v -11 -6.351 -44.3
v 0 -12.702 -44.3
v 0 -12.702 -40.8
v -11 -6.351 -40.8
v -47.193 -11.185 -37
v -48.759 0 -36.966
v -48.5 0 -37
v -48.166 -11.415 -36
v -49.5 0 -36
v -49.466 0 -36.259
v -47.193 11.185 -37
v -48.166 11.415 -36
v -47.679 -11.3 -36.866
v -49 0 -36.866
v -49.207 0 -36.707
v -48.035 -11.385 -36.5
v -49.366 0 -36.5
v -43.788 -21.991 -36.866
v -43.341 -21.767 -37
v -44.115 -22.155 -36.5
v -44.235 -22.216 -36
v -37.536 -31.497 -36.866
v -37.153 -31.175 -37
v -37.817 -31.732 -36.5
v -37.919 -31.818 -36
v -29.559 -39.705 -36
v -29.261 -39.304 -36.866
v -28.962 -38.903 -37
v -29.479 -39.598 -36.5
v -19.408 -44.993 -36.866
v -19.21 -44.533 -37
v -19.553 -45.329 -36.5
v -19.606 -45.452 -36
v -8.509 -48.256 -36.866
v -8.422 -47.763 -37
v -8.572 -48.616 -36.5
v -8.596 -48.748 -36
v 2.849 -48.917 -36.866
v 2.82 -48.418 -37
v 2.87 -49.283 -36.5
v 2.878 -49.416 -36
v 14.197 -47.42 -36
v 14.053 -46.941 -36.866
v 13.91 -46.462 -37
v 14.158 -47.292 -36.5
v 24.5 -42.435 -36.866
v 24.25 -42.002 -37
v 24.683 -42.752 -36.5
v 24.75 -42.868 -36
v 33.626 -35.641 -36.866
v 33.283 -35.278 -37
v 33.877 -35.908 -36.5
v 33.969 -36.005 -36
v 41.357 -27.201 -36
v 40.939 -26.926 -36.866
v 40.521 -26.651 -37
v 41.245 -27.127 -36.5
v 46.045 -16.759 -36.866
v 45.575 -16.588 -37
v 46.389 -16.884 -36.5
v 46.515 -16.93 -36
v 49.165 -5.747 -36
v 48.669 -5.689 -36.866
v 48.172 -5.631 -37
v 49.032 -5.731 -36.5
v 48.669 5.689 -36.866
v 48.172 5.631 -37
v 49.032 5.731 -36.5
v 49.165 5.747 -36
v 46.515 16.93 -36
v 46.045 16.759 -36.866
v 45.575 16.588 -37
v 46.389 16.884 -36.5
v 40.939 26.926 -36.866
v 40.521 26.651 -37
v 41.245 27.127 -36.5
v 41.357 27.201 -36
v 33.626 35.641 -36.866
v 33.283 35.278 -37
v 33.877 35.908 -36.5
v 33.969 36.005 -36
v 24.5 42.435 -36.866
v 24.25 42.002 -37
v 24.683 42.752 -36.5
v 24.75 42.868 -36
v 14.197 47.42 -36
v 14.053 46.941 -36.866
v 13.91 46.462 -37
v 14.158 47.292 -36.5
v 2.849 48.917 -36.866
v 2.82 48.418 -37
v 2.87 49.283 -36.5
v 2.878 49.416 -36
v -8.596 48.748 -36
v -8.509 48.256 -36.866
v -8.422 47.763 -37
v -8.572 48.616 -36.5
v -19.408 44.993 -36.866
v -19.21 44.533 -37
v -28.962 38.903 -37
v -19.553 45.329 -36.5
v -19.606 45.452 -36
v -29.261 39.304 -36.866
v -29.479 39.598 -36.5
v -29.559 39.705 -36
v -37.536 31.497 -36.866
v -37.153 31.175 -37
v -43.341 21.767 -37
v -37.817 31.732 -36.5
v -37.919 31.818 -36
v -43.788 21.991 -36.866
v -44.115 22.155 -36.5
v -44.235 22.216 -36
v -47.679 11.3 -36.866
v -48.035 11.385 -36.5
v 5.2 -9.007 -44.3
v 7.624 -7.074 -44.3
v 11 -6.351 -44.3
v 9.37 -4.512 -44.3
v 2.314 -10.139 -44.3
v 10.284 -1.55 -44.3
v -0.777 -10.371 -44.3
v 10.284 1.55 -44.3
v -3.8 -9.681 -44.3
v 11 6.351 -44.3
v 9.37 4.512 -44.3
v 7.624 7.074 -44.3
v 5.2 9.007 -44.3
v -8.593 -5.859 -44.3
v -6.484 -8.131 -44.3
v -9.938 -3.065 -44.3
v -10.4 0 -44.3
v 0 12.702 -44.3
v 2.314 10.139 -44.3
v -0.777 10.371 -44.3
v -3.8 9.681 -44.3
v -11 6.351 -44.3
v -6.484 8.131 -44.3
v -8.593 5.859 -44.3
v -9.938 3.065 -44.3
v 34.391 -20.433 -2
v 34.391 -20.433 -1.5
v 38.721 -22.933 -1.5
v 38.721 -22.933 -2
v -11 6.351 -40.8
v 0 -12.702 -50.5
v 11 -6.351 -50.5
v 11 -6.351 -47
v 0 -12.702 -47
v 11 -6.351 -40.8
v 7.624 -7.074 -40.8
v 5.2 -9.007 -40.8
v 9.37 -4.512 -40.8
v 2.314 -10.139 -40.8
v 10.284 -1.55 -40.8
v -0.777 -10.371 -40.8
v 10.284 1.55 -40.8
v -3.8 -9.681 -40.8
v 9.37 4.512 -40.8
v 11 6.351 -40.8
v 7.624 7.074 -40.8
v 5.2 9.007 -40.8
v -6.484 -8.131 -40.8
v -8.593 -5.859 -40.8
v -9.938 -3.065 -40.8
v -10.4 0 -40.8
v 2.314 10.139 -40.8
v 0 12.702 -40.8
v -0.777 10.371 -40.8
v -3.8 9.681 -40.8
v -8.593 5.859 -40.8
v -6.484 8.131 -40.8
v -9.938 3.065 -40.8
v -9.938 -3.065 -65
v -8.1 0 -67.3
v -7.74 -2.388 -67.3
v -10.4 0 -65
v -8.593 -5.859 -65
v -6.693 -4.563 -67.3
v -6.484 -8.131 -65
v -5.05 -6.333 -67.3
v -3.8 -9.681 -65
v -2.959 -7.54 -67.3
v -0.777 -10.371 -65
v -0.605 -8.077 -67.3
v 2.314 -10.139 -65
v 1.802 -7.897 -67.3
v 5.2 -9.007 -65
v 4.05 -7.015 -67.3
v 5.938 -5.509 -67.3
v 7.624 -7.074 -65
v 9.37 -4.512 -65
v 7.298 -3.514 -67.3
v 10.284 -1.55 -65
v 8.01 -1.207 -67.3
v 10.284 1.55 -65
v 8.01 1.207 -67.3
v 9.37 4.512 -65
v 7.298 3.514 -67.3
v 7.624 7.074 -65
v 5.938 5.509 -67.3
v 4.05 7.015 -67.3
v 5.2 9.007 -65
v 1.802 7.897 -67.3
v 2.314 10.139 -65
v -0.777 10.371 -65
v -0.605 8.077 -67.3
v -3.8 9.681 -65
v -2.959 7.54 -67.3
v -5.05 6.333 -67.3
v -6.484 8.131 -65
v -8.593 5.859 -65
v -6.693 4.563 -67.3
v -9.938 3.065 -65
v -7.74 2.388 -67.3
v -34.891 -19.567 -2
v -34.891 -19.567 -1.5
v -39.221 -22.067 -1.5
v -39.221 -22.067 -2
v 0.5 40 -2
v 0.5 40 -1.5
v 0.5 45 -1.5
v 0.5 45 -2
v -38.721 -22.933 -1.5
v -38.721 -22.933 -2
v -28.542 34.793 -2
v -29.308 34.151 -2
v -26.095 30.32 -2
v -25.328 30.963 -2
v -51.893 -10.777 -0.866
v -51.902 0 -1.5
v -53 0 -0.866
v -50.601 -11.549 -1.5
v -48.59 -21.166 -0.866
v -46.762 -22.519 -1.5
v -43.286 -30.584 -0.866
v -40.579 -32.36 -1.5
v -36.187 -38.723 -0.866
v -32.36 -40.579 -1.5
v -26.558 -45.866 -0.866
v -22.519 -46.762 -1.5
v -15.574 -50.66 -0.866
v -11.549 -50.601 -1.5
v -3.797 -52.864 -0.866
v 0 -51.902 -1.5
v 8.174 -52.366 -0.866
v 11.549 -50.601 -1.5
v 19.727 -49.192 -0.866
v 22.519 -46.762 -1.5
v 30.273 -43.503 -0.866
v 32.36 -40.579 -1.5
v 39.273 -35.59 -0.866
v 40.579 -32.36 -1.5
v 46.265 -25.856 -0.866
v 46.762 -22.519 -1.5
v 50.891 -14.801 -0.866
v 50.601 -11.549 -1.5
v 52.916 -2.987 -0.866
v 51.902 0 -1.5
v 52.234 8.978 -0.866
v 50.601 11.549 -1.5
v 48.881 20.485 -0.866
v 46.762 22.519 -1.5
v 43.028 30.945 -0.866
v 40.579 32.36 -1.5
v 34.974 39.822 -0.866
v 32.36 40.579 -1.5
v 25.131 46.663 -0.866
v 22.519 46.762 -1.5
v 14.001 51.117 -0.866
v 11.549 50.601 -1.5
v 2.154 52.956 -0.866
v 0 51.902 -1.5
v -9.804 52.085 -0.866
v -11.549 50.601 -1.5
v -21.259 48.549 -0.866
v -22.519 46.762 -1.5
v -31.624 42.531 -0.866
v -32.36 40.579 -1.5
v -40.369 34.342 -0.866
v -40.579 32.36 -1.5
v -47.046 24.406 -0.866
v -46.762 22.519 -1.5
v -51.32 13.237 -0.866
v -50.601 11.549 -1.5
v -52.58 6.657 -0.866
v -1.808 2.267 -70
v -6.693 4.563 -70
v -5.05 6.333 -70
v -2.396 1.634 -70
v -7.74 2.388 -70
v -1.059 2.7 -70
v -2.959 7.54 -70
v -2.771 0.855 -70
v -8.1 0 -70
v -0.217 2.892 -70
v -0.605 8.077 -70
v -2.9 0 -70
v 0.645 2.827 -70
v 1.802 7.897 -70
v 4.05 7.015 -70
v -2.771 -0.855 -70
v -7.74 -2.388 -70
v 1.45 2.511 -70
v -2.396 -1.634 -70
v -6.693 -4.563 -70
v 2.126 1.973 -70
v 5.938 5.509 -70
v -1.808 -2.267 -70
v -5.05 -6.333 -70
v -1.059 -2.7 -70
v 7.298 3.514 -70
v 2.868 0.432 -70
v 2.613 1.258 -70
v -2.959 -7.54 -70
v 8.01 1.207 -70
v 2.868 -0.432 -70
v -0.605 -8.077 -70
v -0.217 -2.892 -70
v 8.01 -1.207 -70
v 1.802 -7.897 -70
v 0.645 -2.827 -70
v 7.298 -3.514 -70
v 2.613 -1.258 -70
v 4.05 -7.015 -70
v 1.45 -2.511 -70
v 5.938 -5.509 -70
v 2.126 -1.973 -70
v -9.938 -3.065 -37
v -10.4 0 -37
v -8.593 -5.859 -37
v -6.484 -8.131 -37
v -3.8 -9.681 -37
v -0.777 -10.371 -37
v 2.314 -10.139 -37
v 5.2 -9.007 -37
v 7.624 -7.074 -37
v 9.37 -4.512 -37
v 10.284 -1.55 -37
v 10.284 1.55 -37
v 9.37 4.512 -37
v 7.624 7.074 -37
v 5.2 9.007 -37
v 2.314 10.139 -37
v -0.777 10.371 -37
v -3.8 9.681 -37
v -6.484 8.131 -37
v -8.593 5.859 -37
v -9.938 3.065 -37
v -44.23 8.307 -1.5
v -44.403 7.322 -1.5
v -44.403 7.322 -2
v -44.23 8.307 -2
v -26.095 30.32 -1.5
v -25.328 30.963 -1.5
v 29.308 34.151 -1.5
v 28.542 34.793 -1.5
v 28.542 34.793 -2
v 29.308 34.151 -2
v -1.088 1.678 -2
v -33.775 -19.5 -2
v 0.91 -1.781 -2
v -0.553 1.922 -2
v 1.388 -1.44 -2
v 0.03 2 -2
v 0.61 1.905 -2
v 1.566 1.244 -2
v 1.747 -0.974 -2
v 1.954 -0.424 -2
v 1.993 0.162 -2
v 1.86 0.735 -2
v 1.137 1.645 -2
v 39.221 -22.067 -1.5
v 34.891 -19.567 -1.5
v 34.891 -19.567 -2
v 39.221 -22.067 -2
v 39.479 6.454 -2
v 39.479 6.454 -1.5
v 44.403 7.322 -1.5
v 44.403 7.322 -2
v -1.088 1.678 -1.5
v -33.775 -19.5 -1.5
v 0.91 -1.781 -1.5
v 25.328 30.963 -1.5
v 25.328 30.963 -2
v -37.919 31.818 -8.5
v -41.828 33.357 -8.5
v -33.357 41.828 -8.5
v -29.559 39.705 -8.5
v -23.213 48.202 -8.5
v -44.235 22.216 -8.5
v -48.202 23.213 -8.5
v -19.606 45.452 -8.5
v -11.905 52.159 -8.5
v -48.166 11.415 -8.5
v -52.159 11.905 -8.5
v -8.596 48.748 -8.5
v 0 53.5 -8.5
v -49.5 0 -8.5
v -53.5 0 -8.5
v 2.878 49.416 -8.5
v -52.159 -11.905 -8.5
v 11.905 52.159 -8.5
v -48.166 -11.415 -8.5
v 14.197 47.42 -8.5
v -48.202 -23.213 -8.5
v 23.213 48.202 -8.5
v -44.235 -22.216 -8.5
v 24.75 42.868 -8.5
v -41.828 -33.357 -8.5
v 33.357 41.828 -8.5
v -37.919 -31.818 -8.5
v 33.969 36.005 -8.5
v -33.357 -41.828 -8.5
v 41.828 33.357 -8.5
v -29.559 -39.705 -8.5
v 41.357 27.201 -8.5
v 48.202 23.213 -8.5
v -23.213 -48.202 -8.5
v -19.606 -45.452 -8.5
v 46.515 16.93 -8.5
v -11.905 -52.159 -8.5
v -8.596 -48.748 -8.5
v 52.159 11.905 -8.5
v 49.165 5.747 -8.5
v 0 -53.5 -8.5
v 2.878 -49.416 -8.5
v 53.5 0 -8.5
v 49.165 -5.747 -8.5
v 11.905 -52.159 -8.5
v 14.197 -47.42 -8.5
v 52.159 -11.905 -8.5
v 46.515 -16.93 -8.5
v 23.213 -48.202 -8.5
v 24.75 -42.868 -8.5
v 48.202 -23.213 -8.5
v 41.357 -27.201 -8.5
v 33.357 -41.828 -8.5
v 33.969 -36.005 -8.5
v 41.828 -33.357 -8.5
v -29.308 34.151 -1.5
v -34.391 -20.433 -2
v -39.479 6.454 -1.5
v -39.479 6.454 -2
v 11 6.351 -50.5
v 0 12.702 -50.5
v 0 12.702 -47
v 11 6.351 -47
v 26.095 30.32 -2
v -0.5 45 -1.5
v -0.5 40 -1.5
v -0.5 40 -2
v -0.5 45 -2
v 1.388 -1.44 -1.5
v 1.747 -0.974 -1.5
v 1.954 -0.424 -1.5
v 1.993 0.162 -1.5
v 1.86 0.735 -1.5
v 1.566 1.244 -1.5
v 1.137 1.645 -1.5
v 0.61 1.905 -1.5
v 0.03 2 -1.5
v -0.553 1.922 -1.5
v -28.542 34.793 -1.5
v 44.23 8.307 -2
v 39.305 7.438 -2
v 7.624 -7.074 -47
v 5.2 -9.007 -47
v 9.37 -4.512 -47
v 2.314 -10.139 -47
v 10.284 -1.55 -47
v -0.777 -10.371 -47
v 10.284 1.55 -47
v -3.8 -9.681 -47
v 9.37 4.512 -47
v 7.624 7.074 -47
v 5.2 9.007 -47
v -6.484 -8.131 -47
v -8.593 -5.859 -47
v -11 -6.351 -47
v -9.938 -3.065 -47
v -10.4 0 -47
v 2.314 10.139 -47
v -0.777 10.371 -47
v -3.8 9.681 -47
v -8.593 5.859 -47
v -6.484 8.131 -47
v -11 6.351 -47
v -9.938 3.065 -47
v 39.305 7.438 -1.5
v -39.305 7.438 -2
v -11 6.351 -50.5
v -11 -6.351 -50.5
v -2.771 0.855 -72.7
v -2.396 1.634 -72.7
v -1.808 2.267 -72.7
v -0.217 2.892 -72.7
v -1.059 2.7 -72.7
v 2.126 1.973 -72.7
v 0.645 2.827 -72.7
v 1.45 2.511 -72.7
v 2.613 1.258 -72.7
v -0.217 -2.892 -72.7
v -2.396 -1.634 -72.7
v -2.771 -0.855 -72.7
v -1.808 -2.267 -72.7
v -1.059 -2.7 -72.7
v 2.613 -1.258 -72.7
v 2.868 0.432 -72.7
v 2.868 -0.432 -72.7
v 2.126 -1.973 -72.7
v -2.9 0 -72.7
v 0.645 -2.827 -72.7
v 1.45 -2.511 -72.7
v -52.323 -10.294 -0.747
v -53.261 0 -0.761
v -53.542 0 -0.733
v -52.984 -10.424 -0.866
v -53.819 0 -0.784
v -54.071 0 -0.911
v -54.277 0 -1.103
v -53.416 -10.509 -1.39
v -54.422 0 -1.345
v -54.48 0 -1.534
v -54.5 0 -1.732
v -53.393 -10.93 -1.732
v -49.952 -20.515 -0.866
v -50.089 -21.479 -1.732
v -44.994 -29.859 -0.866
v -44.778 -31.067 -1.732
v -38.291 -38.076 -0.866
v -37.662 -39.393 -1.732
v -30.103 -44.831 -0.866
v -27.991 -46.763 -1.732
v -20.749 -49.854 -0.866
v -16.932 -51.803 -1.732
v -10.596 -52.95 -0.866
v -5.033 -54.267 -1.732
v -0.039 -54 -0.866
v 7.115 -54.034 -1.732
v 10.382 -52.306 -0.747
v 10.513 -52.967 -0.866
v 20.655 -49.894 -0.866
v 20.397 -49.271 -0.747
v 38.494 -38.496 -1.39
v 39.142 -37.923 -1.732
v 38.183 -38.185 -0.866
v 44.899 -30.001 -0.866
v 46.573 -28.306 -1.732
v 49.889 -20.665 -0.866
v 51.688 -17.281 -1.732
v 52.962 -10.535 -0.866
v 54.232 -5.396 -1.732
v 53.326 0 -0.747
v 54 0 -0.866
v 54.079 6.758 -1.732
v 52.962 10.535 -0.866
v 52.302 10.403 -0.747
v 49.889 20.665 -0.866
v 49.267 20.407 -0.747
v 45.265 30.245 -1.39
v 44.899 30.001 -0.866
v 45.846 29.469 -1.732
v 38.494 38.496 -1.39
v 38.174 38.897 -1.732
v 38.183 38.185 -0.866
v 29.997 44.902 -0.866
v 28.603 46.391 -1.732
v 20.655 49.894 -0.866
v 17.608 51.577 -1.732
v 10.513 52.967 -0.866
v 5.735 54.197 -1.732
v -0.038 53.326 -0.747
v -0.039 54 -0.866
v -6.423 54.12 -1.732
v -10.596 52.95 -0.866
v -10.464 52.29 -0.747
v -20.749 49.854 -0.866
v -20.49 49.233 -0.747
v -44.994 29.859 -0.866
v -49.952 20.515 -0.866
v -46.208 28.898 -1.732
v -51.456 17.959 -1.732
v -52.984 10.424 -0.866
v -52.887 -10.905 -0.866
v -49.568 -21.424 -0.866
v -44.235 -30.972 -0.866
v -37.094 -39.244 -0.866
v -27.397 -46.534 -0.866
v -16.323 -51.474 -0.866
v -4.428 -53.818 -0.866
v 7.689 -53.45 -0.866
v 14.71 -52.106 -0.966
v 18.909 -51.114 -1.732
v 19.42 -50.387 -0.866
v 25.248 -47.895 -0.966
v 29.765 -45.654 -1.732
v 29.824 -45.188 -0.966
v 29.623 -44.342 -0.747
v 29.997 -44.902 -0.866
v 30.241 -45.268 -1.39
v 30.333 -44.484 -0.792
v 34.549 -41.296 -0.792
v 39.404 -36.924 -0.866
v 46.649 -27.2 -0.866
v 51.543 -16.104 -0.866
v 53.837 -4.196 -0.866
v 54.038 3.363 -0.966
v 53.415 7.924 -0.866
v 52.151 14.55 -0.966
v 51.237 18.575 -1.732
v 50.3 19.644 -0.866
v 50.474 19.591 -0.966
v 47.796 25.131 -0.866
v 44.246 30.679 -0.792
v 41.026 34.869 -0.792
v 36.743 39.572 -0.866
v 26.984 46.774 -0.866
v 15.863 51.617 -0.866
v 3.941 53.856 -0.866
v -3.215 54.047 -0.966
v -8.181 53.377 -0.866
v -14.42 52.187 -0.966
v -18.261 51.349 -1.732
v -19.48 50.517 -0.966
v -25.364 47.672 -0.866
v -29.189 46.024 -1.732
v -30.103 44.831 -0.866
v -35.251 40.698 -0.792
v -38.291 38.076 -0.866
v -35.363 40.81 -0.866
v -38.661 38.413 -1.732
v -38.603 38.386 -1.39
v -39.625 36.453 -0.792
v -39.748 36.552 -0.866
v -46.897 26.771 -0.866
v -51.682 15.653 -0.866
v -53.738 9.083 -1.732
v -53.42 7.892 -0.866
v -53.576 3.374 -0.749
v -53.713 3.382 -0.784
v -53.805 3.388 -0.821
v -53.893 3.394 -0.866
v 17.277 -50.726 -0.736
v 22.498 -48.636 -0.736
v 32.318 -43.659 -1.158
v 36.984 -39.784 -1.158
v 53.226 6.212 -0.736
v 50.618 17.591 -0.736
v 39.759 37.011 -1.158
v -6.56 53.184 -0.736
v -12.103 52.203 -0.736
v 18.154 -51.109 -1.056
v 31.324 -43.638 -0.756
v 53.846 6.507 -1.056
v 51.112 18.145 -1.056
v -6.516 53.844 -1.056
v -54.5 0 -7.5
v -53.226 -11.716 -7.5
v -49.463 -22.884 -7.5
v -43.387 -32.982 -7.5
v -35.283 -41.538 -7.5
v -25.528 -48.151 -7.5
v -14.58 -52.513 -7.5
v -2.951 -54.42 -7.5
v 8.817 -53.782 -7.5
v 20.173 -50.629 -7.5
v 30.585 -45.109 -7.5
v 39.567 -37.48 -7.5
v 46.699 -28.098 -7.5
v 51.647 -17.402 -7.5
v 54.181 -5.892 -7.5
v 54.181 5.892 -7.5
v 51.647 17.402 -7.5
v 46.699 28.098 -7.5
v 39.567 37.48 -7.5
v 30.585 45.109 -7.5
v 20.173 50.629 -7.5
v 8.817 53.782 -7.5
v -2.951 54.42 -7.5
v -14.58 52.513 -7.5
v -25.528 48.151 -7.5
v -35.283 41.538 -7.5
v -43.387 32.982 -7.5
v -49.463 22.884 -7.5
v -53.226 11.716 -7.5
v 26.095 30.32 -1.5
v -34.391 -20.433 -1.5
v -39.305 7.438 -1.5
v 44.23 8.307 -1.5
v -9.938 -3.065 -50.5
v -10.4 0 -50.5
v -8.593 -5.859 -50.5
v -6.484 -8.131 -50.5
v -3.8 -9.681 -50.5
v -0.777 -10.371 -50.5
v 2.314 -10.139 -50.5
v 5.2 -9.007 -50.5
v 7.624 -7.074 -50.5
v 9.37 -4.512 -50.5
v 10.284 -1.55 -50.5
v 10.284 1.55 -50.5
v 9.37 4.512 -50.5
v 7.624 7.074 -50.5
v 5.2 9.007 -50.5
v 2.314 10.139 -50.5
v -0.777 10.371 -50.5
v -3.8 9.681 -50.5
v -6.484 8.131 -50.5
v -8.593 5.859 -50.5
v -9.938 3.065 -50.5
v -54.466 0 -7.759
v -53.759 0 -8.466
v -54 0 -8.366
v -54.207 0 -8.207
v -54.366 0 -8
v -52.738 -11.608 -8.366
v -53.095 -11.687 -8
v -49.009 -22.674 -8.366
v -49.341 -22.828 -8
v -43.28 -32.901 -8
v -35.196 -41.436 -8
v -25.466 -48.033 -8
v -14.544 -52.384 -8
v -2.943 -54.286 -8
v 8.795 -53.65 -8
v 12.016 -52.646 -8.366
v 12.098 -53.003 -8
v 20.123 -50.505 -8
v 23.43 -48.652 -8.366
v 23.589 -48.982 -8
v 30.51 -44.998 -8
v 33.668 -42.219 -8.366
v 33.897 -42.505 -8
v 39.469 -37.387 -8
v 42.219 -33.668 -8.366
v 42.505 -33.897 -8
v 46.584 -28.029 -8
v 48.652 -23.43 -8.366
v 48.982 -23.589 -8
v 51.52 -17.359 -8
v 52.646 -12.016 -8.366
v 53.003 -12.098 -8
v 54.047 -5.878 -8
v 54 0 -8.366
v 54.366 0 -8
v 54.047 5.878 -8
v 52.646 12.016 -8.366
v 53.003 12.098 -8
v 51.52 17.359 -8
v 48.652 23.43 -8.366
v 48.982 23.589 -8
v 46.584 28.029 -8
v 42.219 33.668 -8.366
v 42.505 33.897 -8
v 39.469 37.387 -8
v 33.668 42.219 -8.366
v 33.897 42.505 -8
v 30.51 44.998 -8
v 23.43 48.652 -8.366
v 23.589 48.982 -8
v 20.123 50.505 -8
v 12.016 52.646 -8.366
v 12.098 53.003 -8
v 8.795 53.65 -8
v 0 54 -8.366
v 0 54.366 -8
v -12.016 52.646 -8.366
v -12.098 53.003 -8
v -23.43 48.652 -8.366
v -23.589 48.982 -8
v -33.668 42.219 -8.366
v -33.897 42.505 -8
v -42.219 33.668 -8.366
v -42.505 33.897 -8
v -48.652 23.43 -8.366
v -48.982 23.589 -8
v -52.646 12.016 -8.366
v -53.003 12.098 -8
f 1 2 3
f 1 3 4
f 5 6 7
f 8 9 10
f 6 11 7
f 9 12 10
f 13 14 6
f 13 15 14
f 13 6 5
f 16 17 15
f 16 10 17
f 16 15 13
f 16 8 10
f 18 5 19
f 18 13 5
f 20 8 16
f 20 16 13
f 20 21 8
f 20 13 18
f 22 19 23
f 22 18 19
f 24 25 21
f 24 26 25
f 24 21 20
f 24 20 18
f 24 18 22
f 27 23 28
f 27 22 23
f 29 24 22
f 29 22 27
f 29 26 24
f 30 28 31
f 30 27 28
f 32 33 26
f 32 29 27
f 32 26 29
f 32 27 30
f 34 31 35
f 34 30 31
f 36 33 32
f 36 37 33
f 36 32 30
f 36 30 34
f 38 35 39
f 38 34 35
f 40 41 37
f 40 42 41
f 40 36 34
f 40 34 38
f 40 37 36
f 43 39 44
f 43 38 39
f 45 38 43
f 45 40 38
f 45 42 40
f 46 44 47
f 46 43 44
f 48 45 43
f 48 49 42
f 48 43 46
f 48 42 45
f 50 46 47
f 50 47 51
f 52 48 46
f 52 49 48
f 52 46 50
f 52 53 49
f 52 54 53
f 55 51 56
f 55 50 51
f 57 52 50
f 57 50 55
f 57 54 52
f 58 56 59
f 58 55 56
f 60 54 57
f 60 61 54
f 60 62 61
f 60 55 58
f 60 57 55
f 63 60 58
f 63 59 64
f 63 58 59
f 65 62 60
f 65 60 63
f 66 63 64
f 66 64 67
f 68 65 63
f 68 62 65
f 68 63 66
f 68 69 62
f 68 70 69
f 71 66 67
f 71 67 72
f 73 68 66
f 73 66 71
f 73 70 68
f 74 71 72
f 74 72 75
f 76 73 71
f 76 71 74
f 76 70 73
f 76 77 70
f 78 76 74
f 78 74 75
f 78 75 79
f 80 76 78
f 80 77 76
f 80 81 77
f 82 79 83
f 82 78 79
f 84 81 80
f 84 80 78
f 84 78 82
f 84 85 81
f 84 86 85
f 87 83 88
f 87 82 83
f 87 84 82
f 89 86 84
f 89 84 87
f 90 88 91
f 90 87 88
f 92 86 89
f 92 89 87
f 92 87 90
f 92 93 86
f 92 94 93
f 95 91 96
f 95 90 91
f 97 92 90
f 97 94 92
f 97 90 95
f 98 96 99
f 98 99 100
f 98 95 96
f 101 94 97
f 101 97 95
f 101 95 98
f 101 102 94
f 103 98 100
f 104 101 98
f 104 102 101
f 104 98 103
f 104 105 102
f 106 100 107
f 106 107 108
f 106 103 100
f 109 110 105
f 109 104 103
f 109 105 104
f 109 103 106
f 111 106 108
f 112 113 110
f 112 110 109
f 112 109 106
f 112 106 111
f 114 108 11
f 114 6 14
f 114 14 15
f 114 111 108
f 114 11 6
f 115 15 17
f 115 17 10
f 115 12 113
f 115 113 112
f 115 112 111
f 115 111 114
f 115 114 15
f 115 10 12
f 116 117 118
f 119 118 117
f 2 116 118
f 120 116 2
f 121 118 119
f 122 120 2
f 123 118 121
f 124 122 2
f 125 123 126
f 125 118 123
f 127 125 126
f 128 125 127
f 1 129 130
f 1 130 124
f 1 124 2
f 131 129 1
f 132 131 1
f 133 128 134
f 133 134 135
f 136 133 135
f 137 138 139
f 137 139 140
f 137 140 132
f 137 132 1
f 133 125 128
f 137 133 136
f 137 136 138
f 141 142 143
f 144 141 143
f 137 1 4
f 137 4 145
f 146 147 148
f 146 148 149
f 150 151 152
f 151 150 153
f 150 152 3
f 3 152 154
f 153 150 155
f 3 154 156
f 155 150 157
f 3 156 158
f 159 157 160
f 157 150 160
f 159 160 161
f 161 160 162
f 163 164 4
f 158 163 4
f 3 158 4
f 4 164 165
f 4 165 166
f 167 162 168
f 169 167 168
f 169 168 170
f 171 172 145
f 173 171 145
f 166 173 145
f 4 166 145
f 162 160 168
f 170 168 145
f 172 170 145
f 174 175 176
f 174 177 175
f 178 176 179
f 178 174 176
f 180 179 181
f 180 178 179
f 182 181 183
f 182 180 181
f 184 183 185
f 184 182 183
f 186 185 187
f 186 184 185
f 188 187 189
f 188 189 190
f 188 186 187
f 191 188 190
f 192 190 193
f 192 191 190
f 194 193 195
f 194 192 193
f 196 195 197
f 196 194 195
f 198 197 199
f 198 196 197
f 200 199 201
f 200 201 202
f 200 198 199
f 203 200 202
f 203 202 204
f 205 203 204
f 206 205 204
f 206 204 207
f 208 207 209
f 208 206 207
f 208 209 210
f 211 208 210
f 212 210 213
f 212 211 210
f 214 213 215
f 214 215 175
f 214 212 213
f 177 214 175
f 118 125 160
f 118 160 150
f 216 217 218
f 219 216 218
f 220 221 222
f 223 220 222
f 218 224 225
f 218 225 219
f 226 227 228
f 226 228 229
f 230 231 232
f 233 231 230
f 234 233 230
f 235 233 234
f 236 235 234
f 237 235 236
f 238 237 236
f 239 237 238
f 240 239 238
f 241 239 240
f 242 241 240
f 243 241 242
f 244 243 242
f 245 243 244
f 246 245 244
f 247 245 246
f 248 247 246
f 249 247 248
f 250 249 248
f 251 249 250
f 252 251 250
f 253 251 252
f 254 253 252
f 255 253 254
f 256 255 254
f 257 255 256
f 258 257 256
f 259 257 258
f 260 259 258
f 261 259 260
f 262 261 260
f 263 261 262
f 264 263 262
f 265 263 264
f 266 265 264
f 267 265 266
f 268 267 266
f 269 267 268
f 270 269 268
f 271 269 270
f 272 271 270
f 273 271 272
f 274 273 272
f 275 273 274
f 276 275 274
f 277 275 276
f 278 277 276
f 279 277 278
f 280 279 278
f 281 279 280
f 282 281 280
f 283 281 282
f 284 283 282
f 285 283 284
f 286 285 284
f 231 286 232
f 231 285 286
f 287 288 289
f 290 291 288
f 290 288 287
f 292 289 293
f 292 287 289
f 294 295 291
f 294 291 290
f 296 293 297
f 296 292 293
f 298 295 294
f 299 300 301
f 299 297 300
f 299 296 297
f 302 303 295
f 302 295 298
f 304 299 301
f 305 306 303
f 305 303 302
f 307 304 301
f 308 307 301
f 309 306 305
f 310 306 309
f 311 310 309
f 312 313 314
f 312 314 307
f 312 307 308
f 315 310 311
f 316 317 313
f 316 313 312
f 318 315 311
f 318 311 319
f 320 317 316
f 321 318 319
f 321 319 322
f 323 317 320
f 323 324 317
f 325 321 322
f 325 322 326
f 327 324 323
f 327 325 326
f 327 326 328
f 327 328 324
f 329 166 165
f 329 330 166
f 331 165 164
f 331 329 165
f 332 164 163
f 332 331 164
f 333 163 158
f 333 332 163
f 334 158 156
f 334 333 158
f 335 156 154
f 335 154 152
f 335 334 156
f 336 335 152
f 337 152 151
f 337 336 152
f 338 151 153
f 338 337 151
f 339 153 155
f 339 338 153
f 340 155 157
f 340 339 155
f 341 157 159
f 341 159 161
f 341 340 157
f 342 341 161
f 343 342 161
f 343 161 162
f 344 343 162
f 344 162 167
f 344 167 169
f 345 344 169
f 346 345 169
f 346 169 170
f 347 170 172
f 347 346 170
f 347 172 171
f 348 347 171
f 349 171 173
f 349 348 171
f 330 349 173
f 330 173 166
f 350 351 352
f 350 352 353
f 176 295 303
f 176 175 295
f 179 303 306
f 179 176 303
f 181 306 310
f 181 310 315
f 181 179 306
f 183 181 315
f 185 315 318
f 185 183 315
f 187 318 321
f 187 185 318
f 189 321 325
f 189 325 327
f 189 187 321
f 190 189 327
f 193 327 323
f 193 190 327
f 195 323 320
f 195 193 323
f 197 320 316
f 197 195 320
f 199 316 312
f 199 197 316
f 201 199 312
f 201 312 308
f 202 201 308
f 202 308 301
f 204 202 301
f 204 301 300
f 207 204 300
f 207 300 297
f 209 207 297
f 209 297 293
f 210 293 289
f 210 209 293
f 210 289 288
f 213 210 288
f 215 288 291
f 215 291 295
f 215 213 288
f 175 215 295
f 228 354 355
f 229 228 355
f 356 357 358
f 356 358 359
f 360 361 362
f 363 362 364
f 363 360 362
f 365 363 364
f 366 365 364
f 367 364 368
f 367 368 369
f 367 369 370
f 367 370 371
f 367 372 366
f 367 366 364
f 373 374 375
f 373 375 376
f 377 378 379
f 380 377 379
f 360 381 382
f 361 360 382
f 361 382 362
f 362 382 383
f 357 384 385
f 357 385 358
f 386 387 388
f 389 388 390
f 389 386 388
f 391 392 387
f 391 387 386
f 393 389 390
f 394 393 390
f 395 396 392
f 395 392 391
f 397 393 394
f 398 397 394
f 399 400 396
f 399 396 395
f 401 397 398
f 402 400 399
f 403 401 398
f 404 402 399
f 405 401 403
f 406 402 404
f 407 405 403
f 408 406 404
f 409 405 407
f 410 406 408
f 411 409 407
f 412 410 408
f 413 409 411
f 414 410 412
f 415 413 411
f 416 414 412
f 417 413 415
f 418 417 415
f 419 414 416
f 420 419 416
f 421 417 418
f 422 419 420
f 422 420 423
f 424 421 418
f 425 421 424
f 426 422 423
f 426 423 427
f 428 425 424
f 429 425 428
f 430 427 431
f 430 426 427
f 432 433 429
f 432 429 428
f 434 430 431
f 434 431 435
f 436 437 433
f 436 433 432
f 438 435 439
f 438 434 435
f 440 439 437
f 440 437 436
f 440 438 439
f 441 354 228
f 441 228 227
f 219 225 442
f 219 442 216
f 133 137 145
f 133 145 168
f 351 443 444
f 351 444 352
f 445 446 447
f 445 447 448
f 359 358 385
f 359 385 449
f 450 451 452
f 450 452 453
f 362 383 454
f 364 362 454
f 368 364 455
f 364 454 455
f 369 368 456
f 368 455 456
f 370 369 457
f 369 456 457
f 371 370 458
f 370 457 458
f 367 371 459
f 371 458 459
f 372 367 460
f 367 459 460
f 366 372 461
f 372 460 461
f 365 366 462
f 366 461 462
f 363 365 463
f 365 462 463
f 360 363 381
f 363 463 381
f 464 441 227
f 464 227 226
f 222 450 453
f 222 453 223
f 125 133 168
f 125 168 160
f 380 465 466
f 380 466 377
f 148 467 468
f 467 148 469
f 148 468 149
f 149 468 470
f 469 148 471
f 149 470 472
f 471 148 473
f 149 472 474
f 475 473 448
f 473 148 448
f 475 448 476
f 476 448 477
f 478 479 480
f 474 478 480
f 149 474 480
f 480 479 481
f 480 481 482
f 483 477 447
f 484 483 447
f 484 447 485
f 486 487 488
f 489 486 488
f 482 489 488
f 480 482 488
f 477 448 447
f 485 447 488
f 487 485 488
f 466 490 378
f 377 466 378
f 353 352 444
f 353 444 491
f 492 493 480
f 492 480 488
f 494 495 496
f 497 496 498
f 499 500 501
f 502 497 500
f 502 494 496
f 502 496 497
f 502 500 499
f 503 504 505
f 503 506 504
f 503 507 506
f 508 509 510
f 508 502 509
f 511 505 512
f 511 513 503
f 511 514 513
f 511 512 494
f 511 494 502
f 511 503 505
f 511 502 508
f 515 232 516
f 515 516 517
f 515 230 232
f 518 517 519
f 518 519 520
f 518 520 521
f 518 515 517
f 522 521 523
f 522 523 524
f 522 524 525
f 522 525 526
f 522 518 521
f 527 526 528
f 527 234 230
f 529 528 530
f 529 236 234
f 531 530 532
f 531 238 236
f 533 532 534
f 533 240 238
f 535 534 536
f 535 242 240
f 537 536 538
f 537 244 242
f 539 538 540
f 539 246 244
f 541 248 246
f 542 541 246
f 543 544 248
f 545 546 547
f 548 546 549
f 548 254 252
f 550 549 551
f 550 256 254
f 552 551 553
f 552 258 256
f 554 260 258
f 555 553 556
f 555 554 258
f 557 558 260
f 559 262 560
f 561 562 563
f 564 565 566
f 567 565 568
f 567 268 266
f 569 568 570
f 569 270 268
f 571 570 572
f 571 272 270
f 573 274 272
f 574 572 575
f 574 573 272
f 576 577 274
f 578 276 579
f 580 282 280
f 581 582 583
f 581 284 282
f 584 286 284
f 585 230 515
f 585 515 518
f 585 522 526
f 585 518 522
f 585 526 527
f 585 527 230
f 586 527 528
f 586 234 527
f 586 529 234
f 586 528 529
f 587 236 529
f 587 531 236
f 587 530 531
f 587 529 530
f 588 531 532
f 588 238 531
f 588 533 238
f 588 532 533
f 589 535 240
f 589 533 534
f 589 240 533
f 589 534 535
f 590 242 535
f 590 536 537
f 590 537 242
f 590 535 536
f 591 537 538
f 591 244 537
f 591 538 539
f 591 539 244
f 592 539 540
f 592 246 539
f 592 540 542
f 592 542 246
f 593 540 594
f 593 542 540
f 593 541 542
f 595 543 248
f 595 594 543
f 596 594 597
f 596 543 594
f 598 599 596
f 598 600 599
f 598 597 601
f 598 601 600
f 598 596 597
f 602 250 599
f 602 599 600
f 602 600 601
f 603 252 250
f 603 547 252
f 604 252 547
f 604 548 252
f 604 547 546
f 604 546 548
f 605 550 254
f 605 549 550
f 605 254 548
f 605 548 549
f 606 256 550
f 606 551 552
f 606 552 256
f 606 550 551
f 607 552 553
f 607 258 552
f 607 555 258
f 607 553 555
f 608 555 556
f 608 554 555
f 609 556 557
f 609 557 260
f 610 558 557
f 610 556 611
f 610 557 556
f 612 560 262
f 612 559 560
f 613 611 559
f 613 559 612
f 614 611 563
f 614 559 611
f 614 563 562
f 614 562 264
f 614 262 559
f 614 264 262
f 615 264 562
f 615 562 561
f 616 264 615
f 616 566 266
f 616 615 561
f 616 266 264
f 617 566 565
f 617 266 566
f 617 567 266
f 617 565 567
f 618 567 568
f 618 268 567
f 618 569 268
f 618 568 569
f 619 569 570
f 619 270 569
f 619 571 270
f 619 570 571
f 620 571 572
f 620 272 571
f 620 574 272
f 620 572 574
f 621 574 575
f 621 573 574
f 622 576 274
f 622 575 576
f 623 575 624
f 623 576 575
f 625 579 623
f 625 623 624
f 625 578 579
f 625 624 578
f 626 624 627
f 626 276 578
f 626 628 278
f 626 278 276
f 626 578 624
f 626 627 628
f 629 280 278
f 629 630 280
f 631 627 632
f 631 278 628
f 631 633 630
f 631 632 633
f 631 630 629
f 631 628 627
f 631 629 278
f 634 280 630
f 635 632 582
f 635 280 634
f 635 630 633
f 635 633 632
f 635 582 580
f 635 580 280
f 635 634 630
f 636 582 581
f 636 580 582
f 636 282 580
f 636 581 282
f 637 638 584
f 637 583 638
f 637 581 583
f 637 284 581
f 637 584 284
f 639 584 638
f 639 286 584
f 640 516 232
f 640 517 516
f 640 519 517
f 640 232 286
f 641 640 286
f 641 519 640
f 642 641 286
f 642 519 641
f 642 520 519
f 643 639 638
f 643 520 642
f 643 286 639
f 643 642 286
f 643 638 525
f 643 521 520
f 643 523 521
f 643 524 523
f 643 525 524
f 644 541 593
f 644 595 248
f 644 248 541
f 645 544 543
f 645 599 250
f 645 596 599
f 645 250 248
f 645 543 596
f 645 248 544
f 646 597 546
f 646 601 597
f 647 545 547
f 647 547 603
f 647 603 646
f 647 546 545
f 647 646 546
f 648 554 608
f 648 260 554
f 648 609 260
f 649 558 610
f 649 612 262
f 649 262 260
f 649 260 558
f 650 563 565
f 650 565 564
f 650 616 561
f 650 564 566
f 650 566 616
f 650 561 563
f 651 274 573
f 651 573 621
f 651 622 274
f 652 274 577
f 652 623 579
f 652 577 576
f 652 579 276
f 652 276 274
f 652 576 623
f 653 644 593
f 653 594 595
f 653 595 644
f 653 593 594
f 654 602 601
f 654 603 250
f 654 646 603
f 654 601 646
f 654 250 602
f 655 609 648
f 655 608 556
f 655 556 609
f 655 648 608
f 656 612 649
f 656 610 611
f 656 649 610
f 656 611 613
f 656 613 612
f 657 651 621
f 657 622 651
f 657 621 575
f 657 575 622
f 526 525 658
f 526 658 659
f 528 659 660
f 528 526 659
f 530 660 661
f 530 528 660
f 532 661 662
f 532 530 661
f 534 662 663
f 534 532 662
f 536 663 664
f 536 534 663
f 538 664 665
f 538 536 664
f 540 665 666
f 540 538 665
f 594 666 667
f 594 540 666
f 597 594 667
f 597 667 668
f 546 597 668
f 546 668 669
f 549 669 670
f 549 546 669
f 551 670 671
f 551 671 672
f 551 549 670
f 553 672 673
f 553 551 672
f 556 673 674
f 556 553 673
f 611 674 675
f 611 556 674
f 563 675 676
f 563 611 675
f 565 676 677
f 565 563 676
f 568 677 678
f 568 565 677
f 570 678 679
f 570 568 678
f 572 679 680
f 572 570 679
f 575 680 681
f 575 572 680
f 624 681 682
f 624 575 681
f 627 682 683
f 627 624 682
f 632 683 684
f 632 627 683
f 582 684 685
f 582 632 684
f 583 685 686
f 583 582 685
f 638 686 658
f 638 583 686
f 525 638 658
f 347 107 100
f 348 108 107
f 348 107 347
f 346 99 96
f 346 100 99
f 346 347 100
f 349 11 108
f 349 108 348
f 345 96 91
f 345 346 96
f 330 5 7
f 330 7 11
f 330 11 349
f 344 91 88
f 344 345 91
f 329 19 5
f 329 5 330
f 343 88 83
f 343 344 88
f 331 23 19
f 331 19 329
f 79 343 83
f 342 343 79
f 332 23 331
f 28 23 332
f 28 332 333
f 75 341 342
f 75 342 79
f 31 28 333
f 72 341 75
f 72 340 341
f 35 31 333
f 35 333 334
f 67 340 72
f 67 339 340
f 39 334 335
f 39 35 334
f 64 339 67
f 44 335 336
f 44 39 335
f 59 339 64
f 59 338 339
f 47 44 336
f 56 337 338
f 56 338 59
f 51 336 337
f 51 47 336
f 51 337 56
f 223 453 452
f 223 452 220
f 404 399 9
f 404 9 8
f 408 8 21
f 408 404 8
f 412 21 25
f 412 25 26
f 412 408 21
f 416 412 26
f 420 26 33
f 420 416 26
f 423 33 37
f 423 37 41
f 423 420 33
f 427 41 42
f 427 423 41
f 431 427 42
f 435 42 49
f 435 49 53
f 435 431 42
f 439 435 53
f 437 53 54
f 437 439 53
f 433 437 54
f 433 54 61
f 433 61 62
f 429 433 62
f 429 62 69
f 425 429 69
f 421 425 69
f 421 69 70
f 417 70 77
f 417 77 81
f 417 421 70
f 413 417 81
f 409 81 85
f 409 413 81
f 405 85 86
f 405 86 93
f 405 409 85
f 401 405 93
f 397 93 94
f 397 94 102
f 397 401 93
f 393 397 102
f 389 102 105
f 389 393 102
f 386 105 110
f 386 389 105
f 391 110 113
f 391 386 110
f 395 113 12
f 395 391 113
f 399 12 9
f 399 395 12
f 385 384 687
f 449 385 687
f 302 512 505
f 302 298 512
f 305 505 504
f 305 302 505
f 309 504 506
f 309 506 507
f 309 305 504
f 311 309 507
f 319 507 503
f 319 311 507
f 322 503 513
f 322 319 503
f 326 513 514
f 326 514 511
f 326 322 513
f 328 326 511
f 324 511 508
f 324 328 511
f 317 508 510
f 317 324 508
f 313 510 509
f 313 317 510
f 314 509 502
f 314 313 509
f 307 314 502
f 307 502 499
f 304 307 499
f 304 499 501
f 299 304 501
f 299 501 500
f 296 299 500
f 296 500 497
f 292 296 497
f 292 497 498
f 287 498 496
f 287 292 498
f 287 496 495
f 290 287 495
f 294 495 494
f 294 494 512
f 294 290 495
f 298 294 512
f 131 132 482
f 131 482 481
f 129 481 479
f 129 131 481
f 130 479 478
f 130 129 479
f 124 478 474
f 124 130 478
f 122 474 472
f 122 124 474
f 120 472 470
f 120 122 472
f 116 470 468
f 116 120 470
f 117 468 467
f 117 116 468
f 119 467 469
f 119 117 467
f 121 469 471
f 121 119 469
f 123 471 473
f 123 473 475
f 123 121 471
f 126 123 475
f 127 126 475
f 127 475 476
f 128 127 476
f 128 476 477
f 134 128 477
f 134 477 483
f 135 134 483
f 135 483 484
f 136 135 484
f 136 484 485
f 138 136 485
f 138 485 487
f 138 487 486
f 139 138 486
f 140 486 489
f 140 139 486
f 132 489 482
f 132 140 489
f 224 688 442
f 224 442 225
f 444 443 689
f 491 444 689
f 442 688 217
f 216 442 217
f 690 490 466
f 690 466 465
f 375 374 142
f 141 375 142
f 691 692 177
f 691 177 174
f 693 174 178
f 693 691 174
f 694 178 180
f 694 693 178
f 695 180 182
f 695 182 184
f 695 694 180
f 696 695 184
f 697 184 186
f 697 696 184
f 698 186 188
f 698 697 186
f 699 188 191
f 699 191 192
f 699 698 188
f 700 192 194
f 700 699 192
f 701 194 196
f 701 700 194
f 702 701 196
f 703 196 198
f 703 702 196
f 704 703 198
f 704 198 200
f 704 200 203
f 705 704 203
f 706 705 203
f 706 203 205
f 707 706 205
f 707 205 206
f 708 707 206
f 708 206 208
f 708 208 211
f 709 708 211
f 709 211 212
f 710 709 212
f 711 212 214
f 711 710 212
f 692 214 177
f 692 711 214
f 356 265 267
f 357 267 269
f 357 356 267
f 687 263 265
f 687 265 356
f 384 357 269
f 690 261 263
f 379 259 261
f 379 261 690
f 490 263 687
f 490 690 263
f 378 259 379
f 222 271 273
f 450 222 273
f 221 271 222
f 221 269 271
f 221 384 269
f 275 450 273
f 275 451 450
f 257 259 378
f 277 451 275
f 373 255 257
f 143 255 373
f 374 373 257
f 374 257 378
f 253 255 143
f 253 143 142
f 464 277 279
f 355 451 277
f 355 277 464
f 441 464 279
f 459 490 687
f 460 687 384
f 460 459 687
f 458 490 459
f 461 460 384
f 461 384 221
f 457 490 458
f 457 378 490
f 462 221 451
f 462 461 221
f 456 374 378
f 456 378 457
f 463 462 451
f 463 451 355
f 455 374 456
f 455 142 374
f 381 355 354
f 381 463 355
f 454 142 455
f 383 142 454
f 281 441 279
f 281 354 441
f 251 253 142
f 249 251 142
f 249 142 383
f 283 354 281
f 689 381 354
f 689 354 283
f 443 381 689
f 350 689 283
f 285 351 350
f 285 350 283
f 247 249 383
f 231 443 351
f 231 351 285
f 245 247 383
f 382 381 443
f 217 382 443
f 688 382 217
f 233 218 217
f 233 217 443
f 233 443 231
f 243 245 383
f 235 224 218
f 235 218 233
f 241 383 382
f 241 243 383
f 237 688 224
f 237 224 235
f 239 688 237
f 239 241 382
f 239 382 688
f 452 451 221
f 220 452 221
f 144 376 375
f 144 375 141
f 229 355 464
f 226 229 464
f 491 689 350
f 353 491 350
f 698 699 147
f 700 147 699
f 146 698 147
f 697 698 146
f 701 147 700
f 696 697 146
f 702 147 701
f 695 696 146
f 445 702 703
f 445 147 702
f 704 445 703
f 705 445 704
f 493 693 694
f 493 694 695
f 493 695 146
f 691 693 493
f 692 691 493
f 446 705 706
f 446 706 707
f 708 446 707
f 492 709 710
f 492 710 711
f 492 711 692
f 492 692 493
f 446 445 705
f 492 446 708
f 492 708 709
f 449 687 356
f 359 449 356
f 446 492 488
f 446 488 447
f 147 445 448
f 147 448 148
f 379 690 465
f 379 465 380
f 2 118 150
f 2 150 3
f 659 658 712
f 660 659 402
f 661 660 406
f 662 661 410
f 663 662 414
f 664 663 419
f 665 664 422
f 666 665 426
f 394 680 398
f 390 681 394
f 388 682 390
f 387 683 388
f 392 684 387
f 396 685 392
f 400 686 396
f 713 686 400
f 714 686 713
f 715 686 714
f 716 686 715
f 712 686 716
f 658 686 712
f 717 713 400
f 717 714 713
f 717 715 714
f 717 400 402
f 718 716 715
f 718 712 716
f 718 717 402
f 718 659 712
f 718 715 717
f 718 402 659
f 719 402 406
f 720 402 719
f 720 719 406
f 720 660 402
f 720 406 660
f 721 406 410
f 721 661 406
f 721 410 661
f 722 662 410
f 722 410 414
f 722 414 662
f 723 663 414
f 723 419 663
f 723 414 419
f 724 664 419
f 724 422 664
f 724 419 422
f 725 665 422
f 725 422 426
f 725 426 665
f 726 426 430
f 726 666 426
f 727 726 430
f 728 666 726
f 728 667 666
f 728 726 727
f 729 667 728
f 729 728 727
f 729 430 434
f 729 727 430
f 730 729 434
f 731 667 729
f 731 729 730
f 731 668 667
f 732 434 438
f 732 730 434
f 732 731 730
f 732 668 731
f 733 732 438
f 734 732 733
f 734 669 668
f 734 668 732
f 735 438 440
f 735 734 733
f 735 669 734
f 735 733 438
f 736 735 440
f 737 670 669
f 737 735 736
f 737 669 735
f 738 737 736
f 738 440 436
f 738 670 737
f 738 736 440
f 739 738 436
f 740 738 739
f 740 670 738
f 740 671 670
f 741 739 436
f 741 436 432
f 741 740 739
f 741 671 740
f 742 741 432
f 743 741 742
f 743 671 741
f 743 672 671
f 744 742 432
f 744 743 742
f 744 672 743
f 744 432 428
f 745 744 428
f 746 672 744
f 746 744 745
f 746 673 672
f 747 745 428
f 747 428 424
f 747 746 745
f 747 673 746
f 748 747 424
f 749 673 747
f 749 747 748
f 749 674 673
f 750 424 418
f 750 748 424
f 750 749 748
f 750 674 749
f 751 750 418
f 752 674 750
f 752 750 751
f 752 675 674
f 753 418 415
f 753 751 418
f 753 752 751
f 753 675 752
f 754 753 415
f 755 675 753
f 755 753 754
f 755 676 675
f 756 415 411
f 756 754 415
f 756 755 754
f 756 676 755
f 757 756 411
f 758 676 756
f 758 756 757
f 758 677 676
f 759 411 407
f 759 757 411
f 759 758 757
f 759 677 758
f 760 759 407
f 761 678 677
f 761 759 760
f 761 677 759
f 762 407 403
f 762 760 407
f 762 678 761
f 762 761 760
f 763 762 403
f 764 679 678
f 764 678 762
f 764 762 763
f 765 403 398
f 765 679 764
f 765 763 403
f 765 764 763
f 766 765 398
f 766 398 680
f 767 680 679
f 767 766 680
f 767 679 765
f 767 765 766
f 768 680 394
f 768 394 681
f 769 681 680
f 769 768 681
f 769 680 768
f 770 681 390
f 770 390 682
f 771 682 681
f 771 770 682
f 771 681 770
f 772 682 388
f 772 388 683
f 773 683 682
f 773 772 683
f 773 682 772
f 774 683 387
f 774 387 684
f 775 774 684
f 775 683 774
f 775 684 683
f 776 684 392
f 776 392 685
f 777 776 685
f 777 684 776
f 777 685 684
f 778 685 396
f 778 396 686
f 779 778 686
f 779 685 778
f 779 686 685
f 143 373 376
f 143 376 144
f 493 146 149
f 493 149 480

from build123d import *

# Parameters (mm, degrees)
ZAOBLIT1_R               = 1
SKICA2_W                 = 1
SKICA2_H                 = 5
ODEBRAT_VYSUNUT_M1_DEPTH = 0.5
KRUHOV_POLE1_COUNT       = 9
ODEBRAT_VYSUNUT_M2_DEPTH = 0.5
P_IDAT_START             = 13.5
P_IDAT_VYSUNUT_M1_DEPTH  = 3.5
LINPOLE1_COUNT           = 2
LINPOLE1_PITCH           = 6.2


with BuildPart() as part:
    # Skica1 → Rotovat1 (revolve)
    with BuildSketch(Plane(origin=(0, 0, 0), x_dir=(0, 0, -1), z_dir=(1, 0, 0)), mode=Mode.PRIVATE) as rotovat1_sk:
        Polygon((0, 54.5), (1.5, 51.901923789), (1.5, 0), (72.7, 0), (72.7, 2.9), (70, 2.9), (70, 8.1), (67.3, 8.1), (65, 10.4), (37, 10.4), (37, 49.5), (8.5, 49.5), (8.5, 54.5), align=None)
    revolve(rotovat1_sk.sketch.rotate(Axis((0, 0, 0), (0, 0, 1)), 90), axis=Axis((0, 0, 0), (0, 0, 1)))  # turned: the seam where the file's is

    # Zaoblit1
    zaoblit1_edges = [part.edges().sort_by_distance(p)[0] for p in [
        (49.5, 0, -37),
        (54.5, 0, -8.5),
        (54.5, 0, 0),
    ]]
    fillet(zaoblit1_edges, radius=ZAOBLIT1_R)

    # Skica2 → Odebrat vysunutím1 (cut)
    with BuildSketch(Plane.XY.offset(-1.5)):
        with Locations((0, 42.5)):
            Rectangle(SKICA2_W, SKICA2_H)
    odebrat_vysunut_m1 = extrude(amount=-ODEBRAT_VYSUNUT_M1_DEPTH, mode=Mode.SUBTRACT)

    # Kruhové pole1: Odebrat vysunutím1 ×9 about axis, 2 skipped
    kruhov_pole1_axis = Axis((0, 0, 0), (0, 0, -1))
    add([odebrat_vysunut_m1.rotate(kruhov_pole1_axis, i * 360 / KRUHOV_POLE1_COUNT) for i in range(1, KRUHOV_POLE1_COUNT) if i not in (4, 5)], mode=Mode.SUBTRACT)

    # Skica3 → Odebrat vysunutím2 (cut)
    with BuildSketch(Plane.XY.offset(-1.5)):
        with BuildLine():
            Line((-1.087507328, 1.678489741), (-33.774990748, -19.5))
            Line((-33.774990748, -19.5), (0.909861092, -1.781053844))
            ThreePointArc((0.909861092, -1.781053844), (1.732050808, 1), (-1.087507328, 1.678489741))
        make_face()
    extrude(amount=-ODEBRAT_VYSUNUT_M2_DEPTH, mode=Mode.SUBTRACT)

    # Skica4 → Přidat vysunutím1 (add)
    with BuildSketch(Plane(origin=(0, 0, -37), x_dir=(-1, 0, 0), z_dir=(0, 0, -1)).offset(P_IDAT_START)):
        Polygon((0, 12.701705922), (-11, 6.350852961), (-11, -6.350852961), (0, -12.701705922), (11, -6.350852961), (11, 6.350852961), align=None)
    p_idat_vysunut_m1 = extrude(amount=-P_IDAT_VYSUNUT_M1_DEPTH)

    # LinPole1: Přidat vysunutím1 ×2
    with Locations(*[(0, 0, i * LINPOLE1_PITCH) for i in range(1, LINPOLE1_COUNT)]):
        add(p_idat_vysunut_m1)


solid = part.part
